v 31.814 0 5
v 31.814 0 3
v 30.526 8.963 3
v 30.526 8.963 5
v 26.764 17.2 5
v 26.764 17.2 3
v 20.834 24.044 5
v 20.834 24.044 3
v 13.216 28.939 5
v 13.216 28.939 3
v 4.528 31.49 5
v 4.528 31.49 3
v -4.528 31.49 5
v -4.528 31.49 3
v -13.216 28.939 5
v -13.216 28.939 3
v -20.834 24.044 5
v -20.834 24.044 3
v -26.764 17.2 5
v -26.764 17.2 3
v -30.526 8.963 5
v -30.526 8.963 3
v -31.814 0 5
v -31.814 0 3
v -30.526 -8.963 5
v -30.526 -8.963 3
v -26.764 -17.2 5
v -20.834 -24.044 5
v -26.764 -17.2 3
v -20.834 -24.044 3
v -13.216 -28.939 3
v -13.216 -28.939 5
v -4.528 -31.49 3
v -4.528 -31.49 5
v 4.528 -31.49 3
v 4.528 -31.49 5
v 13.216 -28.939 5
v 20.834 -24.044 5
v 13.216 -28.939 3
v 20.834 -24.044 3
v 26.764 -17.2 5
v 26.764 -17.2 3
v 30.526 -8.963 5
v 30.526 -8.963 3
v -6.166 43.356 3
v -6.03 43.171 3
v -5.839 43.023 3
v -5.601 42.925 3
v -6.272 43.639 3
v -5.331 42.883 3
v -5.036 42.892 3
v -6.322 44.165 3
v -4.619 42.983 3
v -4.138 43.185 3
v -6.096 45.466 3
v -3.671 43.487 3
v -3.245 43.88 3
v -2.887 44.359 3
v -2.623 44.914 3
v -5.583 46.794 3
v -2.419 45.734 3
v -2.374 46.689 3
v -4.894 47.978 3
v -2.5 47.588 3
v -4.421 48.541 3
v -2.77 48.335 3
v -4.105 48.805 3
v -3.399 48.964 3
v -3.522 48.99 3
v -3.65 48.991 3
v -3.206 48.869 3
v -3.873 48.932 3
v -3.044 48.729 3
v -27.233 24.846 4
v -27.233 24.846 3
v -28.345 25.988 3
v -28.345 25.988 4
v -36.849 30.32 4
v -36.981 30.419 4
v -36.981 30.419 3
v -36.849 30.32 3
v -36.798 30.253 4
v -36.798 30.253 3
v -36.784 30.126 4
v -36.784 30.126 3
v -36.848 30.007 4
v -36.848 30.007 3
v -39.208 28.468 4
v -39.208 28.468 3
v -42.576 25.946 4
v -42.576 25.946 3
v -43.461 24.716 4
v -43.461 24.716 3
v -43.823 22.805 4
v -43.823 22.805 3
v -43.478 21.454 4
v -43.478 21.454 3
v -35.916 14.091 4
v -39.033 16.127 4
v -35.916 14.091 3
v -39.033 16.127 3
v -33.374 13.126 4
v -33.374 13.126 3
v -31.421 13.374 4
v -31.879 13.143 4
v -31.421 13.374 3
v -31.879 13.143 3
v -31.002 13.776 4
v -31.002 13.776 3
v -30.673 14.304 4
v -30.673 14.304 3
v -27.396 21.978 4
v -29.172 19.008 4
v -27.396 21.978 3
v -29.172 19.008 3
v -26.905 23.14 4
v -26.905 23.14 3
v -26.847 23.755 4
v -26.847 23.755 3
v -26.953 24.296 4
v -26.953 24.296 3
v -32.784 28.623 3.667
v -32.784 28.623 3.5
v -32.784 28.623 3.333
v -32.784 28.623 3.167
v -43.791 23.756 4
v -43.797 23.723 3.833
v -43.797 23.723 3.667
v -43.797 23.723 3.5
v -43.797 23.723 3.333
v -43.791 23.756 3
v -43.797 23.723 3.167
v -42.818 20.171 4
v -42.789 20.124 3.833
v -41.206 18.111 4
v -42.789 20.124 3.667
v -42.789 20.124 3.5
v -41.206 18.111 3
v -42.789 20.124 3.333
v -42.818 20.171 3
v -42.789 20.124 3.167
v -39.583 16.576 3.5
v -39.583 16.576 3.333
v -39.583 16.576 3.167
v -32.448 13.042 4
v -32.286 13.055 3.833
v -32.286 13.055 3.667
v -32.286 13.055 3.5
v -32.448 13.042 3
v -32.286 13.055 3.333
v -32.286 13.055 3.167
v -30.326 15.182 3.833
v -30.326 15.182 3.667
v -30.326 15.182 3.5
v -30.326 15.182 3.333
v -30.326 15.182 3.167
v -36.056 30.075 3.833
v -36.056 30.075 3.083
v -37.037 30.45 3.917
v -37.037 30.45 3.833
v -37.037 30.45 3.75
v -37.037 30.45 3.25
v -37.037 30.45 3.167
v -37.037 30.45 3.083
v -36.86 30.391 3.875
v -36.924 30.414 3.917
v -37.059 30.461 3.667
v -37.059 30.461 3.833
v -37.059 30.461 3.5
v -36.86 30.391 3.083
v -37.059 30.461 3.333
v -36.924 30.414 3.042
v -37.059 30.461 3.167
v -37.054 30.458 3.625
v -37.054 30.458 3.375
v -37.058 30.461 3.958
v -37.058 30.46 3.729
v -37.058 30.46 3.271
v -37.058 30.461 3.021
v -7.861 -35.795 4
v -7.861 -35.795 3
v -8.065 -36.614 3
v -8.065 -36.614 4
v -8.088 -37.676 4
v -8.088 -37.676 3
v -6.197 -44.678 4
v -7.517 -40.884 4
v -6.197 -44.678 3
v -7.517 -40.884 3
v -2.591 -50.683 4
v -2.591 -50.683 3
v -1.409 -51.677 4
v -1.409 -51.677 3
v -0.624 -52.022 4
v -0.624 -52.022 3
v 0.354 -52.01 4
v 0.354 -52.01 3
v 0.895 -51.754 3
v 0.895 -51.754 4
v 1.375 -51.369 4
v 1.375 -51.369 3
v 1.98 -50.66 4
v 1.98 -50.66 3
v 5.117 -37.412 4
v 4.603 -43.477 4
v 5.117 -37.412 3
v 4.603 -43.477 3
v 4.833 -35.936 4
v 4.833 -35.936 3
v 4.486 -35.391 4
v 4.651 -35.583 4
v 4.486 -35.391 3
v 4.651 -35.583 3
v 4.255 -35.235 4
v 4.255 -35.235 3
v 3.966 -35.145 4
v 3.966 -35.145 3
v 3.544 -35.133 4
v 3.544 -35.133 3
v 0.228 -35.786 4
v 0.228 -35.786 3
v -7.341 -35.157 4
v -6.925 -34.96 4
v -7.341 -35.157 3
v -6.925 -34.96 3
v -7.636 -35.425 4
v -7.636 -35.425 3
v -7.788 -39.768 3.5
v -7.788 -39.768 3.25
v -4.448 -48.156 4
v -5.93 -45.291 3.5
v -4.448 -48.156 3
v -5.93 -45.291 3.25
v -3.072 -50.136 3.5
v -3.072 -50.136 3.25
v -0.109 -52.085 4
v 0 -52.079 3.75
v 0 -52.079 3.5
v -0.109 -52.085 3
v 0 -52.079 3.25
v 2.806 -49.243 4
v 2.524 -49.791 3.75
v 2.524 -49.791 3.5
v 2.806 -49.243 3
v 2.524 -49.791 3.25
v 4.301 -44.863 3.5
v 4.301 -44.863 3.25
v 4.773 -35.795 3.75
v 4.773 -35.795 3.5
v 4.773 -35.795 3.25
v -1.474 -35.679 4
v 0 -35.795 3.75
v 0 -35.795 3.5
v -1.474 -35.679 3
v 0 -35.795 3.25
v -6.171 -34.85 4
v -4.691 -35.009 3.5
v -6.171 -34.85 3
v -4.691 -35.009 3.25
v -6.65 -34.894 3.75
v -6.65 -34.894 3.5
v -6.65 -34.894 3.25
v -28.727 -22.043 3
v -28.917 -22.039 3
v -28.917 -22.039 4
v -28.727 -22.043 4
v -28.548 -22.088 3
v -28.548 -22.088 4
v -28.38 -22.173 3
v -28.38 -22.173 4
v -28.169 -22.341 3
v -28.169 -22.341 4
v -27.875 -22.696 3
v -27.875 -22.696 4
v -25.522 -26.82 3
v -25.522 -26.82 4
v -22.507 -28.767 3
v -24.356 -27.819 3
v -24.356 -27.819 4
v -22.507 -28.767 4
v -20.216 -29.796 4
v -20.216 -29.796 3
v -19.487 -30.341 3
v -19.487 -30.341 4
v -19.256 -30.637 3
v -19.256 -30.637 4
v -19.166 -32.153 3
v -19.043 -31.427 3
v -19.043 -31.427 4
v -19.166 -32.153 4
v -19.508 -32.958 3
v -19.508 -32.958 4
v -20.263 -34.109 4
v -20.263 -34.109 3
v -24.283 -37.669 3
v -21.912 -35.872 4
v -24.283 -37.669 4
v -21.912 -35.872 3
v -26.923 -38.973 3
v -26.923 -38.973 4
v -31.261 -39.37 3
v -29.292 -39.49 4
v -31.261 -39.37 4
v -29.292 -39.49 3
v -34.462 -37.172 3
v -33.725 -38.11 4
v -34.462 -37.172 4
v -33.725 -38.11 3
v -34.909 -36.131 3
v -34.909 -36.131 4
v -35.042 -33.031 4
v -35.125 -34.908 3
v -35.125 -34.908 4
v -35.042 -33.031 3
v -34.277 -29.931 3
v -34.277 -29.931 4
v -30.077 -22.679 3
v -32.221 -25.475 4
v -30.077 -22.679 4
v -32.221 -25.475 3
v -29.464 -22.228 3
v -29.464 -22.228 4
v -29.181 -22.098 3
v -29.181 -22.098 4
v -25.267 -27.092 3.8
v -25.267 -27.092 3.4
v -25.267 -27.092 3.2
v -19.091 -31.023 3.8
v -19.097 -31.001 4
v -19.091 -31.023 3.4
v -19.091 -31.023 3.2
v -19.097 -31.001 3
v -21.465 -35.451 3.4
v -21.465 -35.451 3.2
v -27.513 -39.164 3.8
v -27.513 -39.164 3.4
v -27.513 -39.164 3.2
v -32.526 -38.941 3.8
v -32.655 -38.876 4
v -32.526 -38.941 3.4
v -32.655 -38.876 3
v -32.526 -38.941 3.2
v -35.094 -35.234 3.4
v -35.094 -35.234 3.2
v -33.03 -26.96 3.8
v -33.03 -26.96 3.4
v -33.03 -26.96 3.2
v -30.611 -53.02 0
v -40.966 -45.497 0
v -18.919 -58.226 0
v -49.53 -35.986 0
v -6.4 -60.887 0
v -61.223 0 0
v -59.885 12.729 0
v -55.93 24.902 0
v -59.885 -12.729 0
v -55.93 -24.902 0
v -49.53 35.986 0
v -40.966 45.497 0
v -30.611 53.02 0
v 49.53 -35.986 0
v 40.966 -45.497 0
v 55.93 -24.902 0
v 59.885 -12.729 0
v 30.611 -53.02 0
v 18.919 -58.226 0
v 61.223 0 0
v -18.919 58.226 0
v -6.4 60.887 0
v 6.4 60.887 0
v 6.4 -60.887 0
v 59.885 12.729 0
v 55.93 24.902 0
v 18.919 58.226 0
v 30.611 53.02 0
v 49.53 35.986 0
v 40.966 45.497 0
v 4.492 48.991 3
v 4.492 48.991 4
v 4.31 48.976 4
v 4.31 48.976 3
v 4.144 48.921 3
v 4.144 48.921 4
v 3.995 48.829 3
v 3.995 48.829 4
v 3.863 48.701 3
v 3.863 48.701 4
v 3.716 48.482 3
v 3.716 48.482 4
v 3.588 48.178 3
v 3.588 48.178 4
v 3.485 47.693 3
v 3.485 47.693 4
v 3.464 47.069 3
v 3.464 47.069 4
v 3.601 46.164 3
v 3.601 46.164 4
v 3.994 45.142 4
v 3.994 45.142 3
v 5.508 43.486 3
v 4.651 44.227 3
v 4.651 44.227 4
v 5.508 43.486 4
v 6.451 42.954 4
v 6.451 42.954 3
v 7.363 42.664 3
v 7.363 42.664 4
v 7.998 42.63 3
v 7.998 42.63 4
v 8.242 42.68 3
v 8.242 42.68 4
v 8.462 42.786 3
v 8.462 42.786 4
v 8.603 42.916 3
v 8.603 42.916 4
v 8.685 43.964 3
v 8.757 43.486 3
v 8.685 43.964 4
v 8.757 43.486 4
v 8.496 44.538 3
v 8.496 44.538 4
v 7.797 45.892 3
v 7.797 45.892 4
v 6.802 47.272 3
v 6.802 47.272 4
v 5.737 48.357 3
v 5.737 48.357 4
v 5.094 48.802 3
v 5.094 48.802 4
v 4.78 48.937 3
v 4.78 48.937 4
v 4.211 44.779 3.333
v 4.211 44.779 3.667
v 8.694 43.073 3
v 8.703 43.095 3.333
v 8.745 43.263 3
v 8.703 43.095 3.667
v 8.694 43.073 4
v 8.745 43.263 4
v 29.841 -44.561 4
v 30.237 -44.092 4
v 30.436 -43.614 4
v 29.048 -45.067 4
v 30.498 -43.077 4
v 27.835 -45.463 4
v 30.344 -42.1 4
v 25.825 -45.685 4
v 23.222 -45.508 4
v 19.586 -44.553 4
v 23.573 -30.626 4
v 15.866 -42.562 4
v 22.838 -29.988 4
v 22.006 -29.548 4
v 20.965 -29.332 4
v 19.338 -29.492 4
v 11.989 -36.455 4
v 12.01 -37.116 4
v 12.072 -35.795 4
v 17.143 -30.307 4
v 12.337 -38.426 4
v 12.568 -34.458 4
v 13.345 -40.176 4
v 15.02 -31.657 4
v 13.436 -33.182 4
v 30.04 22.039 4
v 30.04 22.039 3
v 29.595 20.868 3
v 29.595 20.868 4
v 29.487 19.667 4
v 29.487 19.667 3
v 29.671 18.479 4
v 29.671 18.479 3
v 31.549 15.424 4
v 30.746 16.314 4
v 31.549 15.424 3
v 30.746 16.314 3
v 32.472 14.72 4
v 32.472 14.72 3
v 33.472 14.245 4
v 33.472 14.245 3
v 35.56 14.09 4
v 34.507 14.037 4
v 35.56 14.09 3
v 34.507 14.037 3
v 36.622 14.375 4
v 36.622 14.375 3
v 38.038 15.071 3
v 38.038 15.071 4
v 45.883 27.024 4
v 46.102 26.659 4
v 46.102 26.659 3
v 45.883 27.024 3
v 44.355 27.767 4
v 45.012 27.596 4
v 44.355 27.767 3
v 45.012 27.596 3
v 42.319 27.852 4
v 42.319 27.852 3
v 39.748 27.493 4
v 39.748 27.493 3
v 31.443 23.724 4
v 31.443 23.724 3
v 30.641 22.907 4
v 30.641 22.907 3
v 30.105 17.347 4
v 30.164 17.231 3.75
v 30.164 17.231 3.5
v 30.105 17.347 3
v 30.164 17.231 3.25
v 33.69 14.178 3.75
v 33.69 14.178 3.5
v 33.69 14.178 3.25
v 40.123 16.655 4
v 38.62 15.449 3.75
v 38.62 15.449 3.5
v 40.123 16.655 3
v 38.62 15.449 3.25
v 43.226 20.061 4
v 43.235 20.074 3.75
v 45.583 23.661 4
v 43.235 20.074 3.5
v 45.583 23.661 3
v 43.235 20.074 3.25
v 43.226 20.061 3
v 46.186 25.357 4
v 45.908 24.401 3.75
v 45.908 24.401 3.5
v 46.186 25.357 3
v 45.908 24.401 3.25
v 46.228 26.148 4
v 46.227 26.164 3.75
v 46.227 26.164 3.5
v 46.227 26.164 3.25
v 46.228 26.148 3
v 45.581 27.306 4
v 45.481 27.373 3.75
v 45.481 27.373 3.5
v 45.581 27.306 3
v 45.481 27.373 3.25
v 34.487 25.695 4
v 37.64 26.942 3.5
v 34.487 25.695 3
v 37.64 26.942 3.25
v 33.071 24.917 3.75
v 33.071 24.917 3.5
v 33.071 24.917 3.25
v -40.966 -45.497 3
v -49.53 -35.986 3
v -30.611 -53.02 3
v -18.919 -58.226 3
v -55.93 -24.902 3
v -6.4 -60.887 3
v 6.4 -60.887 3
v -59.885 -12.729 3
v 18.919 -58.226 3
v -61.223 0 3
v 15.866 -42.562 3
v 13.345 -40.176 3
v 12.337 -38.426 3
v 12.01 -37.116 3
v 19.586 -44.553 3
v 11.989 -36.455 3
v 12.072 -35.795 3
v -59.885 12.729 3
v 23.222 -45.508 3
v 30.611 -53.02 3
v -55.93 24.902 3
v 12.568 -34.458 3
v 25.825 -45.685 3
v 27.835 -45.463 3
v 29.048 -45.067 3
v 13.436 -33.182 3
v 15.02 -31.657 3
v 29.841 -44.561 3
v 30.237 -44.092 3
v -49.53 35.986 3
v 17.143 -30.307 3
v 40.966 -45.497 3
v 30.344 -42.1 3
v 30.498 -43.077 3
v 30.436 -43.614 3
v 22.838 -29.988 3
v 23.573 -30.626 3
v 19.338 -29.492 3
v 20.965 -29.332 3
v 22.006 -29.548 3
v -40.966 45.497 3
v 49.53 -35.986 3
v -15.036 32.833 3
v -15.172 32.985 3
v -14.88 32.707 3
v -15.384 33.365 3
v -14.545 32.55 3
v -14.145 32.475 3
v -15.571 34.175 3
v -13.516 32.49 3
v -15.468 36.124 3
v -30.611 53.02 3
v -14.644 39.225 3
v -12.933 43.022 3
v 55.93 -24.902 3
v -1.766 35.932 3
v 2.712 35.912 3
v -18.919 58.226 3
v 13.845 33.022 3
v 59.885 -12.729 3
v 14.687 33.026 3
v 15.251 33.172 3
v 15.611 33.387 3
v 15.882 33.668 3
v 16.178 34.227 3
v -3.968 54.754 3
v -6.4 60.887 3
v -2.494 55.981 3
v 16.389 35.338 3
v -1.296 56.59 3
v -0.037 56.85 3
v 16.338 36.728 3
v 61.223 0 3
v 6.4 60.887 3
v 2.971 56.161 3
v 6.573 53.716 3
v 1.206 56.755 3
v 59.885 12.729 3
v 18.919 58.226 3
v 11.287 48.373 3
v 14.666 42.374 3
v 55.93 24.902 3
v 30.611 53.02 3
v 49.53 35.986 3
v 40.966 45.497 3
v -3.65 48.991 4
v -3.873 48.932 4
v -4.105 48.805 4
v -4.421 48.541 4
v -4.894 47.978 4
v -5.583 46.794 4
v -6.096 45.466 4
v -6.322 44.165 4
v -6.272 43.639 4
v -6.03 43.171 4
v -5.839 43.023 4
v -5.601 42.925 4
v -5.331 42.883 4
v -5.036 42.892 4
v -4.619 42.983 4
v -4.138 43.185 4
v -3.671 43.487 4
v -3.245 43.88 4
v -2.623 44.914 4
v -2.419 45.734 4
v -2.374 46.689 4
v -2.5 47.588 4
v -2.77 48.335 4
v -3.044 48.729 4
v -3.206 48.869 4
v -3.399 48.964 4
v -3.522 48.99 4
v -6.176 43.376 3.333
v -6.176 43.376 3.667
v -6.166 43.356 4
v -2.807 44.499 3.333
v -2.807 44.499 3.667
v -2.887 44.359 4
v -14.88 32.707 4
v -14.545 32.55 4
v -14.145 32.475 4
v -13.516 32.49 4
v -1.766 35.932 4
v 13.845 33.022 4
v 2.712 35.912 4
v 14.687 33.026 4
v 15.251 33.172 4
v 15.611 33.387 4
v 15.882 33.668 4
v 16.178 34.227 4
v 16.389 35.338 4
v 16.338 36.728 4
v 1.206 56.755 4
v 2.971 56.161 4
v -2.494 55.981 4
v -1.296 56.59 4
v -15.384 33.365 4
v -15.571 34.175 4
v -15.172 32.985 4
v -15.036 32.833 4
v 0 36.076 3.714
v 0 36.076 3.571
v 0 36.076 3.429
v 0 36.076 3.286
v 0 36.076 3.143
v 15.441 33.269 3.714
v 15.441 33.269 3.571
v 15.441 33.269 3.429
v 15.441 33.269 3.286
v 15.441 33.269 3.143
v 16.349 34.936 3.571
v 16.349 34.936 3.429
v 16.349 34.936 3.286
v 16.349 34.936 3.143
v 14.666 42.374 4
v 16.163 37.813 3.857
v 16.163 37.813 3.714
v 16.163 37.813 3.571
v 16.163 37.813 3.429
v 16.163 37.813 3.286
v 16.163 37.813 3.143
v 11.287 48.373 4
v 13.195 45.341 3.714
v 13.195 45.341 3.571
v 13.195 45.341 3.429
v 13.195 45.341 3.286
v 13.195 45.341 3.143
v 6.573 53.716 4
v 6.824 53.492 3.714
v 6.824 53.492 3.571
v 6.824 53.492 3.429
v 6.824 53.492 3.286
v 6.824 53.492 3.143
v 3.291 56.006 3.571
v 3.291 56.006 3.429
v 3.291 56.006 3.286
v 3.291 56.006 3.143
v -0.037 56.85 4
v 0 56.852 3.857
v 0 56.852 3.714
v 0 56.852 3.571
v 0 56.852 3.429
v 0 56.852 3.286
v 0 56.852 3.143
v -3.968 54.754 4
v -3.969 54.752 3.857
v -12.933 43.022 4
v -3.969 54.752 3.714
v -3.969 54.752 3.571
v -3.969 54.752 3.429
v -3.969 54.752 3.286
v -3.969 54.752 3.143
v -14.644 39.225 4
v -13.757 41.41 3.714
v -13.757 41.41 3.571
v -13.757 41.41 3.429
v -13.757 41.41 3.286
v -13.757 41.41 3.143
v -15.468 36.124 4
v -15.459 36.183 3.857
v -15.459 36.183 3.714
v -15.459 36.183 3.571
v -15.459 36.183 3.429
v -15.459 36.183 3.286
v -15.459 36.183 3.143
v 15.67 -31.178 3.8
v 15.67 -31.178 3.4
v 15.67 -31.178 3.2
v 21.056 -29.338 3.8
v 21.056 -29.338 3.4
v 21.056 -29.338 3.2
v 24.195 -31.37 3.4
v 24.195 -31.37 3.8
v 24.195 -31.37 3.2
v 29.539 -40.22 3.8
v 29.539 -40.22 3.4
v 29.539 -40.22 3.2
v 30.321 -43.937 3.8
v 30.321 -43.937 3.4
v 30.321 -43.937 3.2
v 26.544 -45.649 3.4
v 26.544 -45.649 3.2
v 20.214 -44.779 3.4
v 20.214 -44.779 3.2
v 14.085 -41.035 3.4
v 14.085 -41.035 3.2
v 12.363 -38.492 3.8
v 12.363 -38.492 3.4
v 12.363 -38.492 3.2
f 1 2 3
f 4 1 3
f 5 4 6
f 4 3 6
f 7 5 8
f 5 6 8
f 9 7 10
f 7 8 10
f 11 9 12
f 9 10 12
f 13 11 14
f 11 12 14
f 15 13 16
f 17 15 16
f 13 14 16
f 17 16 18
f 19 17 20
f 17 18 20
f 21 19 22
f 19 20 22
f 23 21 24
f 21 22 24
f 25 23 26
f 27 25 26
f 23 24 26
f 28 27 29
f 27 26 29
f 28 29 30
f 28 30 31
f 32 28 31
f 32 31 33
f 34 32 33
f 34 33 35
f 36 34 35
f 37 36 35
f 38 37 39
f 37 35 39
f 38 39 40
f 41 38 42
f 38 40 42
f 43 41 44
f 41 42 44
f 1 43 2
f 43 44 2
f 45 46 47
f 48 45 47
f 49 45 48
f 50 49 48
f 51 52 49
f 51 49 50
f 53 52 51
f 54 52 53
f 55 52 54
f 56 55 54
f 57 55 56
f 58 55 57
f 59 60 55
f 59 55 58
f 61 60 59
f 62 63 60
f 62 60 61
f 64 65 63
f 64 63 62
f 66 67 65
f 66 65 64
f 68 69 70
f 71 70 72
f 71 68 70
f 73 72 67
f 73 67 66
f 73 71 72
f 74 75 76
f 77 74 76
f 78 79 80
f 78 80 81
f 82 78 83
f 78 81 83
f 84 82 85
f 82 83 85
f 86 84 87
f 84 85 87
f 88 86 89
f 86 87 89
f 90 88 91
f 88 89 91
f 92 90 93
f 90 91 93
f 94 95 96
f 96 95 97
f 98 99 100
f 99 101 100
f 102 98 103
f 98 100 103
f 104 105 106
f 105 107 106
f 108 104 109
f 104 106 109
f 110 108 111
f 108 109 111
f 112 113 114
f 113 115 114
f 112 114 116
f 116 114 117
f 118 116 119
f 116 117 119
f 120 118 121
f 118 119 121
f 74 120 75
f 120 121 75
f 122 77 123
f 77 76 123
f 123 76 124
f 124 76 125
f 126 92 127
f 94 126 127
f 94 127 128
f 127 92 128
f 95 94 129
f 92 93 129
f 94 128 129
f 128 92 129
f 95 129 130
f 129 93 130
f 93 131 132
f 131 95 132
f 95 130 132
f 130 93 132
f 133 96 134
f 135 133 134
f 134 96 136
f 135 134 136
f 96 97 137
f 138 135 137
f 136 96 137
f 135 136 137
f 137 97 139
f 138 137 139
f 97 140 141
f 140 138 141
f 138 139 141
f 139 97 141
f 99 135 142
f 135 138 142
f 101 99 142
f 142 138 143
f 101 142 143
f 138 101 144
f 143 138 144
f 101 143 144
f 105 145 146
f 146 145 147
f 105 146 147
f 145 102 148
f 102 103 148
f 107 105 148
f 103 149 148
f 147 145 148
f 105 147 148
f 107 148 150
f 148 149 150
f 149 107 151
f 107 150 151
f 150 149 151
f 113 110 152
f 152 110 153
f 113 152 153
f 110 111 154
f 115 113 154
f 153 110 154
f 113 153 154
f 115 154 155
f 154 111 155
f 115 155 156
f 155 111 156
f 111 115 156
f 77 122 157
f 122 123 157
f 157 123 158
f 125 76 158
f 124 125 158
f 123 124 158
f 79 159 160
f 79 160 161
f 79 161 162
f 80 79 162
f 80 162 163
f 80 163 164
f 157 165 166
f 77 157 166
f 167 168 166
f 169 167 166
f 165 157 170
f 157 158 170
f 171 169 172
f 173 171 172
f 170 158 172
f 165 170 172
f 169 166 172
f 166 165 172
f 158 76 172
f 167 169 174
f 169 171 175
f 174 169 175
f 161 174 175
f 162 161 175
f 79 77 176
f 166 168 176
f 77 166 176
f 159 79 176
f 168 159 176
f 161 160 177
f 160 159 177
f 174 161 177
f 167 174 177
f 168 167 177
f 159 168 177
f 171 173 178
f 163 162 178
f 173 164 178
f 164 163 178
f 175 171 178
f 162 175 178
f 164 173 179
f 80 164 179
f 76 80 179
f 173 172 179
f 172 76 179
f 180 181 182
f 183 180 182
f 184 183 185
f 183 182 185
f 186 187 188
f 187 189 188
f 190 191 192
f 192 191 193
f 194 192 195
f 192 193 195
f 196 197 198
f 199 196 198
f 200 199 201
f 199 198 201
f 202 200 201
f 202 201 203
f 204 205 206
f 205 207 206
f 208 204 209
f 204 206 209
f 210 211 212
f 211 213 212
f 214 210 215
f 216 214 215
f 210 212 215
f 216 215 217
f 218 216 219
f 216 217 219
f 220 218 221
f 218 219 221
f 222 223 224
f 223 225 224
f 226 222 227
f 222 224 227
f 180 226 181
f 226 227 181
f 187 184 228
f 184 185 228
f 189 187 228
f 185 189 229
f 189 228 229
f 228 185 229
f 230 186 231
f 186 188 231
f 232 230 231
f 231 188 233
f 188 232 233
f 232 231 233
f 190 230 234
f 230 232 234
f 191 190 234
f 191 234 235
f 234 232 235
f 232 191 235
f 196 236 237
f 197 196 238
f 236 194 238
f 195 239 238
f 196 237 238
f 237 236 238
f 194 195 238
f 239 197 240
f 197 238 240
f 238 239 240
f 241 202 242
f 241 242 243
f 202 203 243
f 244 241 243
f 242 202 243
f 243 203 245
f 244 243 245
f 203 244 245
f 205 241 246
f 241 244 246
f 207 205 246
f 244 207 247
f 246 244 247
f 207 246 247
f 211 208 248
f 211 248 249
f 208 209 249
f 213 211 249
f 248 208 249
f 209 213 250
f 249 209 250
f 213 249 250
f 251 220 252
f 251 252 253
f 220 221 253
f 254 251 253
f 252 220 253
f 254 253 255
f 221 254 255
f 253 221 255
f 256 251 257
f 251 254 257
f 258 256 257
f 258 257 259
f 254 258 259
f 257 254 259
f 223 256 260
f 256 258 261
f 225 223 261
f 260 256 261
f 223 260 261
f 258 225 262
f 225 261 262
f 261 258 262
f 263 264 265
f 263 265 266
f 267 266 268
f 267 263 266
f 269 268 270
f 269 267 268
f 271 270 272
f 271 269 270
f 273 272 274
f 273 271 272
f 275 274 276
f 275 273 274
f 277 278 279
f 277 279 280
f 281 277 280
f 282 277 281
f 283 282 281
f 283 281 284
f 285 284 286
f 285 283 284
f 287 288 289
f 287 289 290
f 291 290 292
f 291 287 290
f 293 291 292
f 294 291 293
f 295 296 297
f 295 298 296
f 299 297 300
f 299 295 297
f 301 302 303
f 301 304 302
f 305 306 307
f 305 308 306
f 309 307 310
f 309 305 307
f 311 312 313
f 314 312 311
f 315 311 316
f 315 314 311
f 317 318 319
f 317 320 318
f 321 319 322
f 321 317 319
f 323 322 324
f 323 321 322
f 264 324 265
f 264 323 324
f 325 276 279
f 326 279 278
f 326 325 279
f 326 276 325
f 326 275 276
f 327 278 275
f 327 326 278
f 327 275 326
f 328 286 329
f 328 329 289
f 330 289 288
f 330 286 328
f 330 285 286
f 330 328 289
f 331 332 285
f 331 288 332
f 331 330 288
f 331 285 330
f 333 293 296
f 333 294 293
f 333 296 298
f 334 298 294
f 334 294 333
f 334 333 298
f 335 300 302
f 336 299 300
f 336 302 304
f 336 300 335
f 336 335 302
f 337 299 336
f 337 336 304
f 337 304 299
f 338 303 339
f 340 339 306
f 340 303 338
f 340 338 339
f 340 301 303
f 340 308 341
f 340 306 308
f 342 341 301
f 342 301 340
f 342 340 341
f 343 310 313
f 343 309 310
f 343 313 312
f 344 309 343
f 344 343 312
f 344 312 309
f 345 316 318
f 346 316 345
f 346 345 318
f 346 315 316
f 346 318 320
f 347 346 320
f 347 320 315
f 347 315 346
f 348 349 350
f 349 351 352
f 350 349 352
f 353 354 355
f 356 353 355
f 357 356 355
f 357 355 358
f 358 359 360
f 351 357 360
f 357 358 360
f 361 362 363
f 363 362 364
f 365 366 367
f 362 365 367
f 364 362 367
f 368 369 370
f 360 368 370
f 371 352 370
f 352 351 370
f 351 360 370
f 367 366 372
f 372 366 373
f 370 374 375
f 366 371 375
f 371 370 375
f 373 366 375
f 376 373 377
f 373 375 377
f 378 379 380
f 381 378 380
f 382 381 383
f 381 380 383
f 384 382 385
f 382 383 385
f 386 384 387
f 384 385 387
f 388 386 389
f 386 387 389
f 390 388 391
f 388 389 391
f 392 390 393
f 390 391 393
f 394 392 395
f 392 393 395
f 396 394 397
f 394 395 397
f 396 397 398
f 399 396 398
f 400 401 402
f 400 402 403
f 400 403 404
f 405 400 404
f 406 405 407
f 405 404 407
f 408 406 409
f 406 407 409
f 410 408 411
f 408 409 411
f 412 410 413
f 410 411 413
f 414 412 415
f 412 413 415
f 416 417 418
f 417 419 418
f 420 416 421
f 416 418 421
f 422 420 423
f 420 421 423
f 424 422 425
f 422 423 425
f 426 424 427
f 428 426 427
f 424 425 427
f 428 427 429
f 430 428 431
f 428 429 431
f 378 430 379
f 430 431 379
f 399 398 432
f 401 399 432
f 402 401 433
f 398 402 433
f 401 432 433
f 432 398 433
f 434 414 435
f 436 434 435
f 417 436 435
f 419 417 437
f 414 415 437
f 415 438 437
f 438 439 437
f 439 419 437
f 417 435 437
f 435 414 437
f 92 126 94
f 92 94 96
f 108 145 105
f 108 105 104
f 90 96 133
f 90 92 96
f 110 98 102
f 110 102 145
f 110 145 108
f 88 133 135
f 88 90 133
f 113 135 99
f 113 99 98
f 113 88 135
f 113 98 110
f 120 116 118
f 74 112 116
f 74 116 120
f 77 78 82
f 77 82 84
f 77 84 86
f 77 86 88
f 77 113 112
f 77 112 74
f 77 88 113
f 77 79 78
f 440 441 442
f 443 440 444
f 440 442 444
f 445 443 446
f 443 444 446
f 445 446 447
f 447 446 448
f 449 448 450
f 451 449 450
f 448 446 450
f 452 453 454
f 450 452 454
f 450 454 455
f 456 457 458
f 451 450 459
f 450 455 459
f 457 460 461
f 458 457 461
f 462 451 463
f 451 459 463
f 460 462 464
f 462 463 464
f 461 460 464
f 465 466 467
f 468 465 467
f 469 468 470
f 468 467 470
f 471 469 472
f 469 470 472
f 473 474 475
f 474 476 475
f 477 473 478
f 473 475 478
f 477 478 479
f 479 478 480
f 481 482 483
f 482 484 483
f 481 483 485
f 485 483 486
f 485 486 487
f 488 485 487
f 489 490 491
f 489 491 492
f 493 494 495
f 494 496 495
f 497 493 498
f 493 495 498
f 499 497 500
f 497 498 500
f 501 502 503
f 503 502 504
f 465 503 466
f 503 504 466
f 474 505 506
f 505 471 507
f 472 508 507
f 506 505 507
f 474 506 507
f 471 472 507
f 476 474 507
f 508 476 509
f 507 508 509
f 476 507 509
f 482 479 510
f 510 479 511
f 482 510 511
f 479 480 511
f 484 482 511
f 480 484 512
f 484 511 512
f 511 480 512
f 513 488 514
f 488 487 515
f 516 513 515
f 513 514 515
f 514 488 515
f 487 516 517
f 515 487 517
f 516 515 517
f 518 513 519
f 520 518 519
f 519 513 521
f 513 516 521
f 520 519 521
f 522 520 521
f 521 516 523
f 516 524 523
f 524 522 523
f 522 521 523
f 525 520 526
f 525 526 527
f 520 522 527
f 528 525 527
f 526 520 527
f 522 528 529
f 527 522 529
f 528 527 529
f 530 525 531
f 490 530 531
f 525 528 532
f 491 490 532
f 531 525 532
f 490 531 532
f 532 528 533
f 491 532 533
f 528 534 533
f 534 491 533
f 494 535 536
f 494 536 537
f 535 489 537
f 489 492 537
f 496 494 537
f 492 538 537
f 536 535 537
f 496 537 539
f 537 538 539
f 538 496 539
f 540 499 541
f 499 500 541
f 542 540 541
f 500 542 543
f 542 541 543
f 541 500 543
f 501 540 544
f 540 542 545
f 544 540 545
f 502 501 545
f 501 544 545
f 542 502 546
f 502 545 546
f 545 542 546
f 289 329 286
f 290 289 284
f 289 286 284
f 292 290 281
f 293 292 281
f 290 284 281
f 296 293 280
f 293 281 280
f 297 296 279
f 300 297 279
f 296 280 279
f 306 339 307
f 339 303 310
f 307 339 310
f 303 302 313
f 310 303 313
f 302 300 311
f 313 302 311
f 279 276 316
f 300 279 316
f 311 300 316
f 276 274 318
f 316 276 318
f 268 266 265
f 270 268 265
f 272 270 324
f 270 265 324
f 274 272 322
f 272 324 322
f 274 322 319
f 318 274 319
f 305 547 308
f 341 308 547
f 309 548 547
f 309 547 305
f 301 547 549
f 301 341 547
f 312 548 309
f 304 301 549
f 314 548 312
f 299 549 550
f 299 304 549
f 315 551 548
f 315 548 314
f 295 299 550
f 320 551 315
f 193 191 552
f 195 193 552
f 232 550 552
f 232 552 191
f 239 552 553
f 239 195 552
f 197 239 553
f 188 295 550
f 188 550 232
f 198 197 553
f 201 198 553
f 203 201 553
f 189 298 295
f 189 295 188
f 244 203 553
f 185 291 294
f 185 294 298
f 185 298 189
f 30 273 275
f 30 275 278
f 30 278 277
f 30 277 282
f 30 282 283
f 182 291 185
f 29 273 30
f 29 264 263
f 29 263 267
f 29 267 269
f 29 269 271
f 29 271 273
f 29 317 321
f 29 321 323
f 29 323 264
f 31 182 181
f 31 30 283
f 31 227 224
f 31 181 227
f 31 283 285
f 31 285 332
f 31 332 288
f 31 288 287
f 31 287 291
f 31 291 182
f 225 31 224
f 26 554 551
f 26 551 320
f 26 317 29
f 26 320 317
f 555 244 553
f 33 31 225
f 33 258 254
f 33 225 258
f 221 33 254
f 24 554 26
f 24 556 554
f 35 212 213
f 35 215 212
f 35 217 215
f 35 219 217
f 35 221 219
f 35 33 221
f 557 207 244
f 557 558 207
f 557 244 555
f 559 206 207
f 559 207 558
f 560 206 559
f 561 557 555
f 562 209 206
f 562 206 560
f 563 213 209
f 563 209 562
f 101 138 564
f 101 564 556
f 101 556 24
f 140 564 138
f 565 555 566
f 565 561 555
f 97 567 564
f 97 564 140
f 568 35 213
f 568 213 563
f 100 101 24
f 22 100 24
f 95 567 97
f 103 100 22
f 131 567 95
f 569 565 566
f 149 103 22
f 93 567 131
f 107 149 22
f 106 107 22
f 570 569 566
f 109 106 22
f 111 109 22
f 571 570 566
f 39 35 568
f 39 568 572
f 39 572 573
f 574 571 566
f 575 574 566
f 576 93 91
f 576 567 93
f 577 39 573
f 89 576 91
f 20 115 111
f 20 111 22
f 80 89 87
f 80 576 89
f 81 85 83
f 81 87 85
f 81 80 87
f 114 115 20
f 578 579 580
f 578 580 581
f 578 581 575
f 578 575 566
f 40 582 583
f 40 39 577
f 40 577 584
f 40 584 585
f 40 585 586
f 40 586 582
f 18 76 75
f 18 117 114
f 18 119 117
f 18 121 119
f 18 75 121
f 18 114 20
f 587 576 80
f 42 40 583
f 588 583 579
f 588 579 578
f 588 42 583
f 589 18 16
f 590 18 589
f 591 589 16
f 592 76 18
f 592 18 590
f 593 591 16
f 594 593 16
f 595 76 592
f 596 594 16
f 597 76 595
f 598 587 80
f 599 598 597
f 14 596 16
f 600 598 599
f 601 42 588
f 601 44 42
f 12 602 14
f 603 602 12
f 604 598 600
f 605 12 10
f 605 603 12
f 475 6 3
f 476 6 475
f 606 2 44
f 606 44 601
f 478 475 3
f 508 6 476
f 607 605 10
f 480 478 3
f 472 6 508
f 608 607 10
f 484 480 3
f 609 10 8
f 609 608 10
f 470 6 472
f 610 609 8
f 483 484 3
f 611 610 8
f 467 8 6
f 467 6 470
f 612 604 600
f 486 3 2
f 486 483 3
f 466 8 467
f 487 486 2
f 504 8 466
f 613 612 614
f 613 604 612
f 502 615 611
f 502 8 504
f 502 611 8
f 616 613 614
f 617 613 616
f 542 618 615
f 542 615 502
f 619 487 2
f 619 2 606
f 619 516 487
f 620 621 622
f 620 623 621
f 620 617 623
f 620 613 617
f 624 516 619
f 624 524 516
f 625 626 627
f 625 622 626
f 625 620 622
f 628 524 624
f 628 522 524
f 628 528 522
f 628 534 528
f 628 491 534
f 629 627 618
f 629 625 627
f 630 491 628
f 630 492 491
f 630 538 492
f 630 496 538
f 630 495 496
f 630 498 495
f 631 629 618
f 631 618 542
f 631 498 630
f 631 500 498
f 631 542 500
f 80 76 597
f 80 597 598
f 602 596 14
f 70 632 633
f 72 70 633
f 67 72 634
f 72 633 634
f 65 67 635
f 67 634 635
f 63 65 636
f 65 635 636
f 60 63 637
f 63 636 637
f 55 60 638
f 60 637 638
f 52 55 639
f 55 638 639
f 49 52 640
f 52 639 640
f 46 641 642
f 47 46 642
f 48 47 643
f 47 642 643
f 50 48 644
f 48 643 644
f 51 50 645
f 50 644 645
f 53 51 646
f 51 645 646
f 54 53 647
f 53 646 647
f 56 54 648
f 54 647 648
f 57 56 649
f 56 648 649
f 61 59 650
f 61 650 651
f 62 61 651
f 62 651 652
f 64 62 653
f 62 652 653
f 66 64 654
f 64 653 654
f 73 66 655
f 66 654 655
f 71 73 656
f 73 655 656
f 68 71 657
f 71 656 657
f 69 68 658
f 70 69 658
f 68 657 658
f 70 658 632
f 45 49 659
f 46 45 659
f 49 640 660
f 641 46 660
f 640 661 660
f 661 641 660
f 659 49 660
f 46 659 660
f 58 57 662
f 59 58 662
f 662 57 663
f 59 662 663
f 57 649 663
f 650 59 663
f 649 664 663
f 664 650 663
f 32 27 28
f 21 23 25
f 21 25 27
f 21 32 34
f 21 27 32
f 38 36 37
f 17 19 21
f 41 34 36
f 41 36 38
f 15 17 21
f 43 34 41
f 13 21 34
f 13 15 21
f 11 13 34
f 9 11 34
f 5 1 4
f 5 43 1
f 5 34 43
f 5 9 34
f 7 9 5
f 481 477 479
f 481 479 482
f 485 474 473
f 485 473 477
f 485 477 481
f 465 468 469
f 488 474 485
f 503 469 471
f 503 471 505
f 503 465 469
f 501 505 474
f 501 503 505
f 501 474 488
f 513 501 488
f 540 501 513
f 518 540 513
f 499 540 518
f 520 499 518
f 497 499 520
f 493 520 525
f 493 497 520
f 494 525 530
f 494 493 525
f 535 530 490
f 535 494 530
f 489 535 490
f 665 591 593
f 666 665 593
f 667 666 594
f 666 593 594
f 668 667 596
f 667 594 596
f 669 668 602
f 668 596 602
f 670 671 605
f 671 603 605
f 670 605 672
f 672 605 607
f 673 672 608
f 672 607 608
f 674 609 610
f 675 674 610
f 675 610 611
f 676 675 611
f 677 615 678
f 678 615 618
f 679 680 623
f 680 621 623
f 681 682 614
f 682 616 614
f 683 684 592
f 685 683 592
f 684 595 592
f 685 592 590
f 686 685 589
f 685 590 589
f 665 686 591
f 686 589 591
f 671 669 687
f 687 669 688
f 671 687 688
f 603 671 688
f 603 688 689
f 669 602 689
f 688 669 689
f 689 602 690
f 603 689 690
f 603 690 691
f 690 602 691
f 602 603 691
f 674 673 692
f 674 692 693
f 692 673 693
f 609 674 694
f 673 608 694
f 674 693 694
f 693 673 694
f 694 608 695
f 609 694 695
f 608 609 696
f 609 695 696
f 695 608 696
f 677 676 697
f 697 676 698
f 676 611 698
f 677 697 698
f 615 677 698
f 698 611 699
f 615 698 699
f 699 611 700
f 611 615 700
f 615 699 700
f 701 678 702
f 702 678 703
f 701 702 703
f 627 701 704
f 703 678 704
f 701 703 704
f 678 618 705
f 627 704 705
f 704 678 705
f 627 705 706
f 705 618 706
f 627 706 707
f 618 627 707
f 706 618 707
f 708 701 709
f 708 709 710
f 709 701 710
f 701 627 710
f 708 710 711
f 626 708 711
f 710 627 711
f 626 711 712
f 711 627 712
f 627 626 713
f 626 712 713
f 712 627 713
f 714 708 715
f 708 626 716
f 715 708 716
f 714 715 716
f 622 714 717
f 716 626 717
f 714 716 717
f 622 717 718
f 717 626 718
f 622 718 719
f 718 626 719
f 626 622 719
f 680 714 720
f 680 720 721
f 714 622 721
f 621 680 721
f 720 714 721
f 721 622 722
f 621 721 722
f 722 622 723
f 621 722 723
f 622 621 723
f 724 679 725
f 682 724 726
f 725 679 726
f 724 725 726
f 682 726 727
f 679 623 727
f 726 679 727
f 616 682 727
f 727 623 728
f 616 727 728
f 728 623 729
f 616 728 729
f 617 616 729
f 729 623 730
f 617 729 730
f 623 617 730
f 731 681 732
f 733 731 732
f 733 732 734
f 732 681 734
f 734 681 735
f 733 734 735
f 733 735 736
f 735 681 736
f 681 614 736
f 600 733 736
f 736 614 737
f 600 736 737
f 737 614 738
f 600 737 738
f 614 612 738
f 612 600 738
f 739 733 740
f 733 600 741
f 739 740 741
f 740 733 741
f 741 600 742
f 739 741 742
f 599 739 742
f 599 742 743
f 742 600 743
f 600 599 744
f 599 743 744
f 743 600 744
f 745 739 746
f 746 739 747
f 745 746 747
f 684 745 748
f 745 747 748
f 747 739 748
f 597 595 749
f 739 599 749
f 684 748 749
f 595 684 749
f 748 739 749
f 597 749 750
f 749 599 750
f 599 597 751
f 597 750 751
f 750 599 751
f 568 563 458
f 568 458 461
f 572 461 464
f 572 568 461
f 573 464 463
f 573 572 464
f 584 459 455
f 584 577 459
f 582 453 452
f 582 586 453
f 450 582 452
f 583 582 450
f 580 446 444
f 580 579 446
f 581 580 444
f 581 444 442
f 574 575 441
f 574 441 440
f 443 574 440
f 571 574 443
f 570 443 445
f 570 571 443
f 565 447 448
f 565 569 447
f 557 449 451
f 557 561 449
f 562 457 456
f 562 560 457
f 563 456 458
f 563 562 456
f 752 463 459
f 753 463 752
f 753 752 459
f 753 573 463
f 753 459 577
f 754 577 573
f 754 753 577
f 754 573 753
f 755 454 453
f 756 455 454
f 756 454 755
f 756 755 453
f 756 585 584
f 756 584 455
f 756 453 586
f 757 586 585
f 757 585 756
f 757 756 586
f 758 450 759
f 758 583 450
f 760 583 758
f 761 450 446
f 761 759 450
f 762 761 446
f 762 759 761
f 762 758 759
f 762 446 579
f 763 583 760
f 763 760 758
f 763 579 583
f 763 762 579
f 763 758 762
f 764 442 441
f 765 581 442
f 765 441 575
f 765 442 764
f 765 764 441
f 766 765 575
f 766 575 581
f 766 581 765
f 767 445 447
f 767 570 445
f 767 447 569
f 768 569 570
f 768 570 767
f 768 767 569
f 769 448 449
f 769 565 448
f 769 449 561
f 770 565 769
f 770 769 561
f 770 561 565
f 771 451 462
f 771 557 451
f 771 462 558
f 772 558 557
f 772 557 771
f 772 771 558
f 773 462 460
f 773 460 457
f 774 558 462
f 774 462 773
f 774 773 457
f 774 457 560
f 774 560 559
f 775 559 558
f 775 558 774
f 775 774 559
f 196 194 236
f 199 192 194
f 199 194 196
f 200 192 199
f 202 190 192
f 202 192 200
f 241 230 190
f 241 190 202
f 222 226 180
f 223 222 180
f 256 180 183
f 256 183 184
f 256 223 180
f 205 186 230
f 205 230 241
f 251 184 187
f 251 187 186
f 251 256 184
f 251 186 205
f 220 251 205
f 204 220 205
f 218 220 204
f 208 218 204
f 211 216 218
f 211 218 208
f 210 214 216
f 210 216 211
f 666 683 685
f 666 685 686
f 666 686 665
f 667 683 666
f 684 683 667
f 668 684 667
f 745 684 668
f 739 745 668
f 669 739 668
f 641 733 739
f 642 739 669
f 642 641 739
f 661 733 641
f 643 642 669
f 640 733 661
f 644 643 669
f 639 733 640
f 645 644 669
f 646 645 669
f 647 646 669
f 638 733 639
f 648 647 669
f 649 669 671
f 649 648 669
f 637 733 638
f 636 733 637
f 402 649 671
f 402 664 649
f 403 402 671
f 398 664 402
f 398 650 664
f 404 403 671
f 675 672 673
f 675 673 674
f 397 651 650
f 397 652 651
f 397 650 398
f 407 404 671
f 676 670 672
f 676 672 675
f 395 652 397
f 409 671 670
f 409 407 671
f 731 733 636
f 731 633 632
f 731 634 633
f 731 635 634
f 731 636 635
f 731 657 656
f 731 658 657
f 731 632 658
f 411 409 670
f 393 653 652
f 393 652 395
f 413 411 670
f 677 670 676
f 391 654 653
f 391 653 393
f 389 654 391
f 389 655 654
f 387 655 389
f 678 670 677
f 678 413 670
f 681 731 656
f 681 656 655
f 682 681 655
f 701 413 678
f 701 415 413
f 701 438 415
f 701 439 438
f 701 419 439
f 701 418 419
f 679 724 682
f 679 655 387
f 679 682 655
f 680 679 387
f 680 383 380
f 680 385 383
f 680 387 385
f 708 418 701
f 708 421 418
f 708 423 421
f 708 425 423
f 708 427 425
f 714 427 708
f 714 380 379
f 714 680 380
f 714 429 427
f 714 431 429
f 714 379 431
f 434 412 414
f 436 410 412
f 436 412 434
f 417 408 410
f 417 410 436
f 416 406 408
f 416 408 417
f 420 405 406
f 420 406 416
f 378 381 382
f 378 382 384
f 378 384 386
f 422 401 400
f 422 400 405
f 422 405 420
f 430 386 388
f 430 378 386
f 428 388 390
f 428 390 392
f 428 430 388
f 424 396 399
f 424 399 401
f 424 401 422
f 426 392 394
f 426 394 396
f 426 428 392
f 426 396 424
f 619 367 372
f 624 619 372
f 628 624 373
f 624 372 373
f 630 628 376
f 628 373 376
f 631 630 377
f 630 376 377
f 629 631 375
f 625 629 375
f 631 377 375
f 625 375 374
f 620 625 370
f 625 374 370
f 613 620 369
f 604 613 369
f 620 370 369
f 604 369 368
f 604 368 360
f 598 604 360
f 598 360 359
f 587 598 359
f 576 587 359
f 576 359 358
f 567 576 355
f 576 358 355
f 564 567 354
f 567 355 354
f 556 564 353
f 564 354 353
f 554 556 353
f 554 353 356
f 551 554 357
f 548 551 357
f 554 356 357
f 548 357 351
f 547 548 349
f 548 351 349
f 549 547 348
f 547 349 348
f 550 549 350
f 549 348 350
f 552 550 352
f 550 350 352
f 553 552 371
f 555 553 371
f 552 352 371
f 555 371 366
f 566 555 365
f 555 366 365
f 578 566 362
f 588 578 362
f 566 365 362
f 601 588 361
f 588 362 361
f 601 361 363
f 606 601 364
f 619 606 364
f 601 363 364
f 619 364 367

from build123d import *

# Parameters (mm, degrees)
F0_R     = 61.2226835339
F1_DEPTH = 3
F2_R     = 31.8142279916
F3_DEPTH = 2
F5_DEPTH = 1
F7_DEPTH = 1
F9_DEPTH = 1


with BuildPart() as f1:
    # F0 (on Top) → F1 (new body)
    with BuildSketch(Plane.XY):
        Circle(F0_R)
    extrude(amount=F1_DEPTH)

    # F2 (on face) → F3 (join)
    with BuildSketch(Plane.XY.offset(3)):
        Circle(F2_R)
    extrude(amount=F3_DEPTH)

    # F4 (on face) → F5 (join)
    with BuildSketch(Plane.XY.offset(3)):
        with BuildLine():
            add(Edge.make_bspline(
                [(-14.87968117, 32.7072180808), (-12.9078093745, 31.387344526), (0.0578711193, 40.5124214051), (18.9971252767, 28.0651679358), (14.4710653767, 46.9261725299), (-0.1142532985, 61.113526996), (-7.4677472524, 49.9176480493), (-14.0853789879, 43.0270366462), (-16.3751816085, 33.7082321854), (-14.87968117, 32.7072180808)],
                knots=[0, 0, 0, 0, 0.1564167654, 0.3150630542, 0.4553916294, 0.6229649329, 0.7467966593, 0.8813709179, 1, 1, 1, 1], degree=3))
        make_face()
    extrude(amount=F5_DEPTH)

    # F6 (on face) → F7 (join)
    with BuildSketch(Plane.XY.offset(3)):
        with BuildLine():
            add(Edge.make_bspline(
                [(-27.2326227278, 24.8462557793), (-28.9600024397, 27.4164790456), (-38.5472361274, 31.0500317907), (-35.4231704349, 29.8042864663), (-51.5005992935, 24.4137840326), (-29.8368693728, 8.3759494407), (-30.4404623041, 19.6136681066), (-25.9525831033, 22.9416440707), (-27.2326227278, 24.8462557793)],
                knots=[0, 0, 0, 0, 0.2087336544, 0.2478300017, 0.4394454659, 0.6852509841, 0.8453221682, 1, 1, 1, 1], degree=3))
        make_face()
        with BuildLine():
            add(Edge.make_bspline(
                [(-28.917113319, -22.0387708396), (-27.5003930415, -21.9098535472), (-26.6990568222, -28.8922288853), (-14.8331141955, -29.5306728354), (-27.1673748588, -41.9065069488), (-39.1660375744, -36.9431954506), (-31.0829784884, -22.2358580683), (-28.917113319, -22.0387708396)],
                knots=[0, 0, 0, 0, 0.1625033694, 0.3386108404, 0.5613775423, 0.7515667748, 1, 1, 1, 1], degree=3))
        make_face()
        with BuildLine():
            add(Edge.make_bspline(
                [(-7.8609632328, -35.7954576612), (-9.3032232795, -39.0689272966), (1.3529994687, -65.3423557846), (7.3502830994, -31.6092071176), (0.0843054699, -37.5875485081), (-6.9100017785, -33.6370789053), (-7.8609632328, -35.7954576612)],
                knots=[0, 0, 0, 0, 0.3182837643, 0.6266147876, 0.7901379906, 1, 1, 1, 1], degree=3))
        make_face()
        with BuildLine():
            add(Edge.make_bspline(
                [(12.0721934363, -35.7954576612), (12.7845084674, -32.3558509787), (22.4552654373, -26.2256059935), (26.0415490673, -35.5120988732), (33.9888682992, -45.5846452509), (19.2629874981, -46.6235297098), (11.3265194922, -39.3961469201), (12.0721934363, -35.7954576612)],
                knots=[0, 0, 0, 0, 0.2090419656, 0.3906159753, 0.5810239034, 0.7811682469, 1, 1, 1, 1], degree=3))
        make_face()
        with BuildLine():
            add(Edge.make_bspline(
                [(30.0401095301, 22.0387708396), (28.3222311363, 18.9156989541), (33.7733886466, 10.4638328697), (43.3791296248, 19.144534311), (49.9146437231, 30.91010751), (32.3986367127, 26.3265306496), (30.0401095301, 22.0387708396)],
                knots=[0, 0, 0, 0, 0.224748734, 0.4804602213, 0.6914356683, 1, 1, 1, 1], degree=3))
        make_face()
    extrude(amount=F7_DEPTH)

    # F8 (on face) → F9 (cut)
    with BuildSketch(Plane.XY.offset(4)):
        with BuildLine():
            add(Edge.make_bspline(
                [(-3.6497339606, 48.9906445146), (-4.9441305584, 48.8632643976), (-8.3277209771, 41.5516230066), (-1.3143864863, 43.681220463), (-2.5345606049, 49.1003874734), (-3.6497339606, 48.9906445146)],
                knots=[0, 0, 0, 0, 0.3815367486, 0.6712911507, 1, 1, 1, 1], degree=3))
        make_face()
        with BuildLine():
            add(Edge.make_bspline(
                [(4.4919815846, 48.9906445146), (3.3039956811, 49.0363284506), (2.7818272854, 43.8207759873), (11.7835506279, 40.8205314489), (6.0484948115, 48.9307888795), (4.4919815846, 48.9906445146)],
                knots=[0, 0, 0, 0, 0.2961767067, 0.6119457645, 1, 1, 1, 1], degree=3))
        make_face()
    extrude(amount=-F9_DEPTH, mode=Mode.SUBTRACT)


solid = f1.part
